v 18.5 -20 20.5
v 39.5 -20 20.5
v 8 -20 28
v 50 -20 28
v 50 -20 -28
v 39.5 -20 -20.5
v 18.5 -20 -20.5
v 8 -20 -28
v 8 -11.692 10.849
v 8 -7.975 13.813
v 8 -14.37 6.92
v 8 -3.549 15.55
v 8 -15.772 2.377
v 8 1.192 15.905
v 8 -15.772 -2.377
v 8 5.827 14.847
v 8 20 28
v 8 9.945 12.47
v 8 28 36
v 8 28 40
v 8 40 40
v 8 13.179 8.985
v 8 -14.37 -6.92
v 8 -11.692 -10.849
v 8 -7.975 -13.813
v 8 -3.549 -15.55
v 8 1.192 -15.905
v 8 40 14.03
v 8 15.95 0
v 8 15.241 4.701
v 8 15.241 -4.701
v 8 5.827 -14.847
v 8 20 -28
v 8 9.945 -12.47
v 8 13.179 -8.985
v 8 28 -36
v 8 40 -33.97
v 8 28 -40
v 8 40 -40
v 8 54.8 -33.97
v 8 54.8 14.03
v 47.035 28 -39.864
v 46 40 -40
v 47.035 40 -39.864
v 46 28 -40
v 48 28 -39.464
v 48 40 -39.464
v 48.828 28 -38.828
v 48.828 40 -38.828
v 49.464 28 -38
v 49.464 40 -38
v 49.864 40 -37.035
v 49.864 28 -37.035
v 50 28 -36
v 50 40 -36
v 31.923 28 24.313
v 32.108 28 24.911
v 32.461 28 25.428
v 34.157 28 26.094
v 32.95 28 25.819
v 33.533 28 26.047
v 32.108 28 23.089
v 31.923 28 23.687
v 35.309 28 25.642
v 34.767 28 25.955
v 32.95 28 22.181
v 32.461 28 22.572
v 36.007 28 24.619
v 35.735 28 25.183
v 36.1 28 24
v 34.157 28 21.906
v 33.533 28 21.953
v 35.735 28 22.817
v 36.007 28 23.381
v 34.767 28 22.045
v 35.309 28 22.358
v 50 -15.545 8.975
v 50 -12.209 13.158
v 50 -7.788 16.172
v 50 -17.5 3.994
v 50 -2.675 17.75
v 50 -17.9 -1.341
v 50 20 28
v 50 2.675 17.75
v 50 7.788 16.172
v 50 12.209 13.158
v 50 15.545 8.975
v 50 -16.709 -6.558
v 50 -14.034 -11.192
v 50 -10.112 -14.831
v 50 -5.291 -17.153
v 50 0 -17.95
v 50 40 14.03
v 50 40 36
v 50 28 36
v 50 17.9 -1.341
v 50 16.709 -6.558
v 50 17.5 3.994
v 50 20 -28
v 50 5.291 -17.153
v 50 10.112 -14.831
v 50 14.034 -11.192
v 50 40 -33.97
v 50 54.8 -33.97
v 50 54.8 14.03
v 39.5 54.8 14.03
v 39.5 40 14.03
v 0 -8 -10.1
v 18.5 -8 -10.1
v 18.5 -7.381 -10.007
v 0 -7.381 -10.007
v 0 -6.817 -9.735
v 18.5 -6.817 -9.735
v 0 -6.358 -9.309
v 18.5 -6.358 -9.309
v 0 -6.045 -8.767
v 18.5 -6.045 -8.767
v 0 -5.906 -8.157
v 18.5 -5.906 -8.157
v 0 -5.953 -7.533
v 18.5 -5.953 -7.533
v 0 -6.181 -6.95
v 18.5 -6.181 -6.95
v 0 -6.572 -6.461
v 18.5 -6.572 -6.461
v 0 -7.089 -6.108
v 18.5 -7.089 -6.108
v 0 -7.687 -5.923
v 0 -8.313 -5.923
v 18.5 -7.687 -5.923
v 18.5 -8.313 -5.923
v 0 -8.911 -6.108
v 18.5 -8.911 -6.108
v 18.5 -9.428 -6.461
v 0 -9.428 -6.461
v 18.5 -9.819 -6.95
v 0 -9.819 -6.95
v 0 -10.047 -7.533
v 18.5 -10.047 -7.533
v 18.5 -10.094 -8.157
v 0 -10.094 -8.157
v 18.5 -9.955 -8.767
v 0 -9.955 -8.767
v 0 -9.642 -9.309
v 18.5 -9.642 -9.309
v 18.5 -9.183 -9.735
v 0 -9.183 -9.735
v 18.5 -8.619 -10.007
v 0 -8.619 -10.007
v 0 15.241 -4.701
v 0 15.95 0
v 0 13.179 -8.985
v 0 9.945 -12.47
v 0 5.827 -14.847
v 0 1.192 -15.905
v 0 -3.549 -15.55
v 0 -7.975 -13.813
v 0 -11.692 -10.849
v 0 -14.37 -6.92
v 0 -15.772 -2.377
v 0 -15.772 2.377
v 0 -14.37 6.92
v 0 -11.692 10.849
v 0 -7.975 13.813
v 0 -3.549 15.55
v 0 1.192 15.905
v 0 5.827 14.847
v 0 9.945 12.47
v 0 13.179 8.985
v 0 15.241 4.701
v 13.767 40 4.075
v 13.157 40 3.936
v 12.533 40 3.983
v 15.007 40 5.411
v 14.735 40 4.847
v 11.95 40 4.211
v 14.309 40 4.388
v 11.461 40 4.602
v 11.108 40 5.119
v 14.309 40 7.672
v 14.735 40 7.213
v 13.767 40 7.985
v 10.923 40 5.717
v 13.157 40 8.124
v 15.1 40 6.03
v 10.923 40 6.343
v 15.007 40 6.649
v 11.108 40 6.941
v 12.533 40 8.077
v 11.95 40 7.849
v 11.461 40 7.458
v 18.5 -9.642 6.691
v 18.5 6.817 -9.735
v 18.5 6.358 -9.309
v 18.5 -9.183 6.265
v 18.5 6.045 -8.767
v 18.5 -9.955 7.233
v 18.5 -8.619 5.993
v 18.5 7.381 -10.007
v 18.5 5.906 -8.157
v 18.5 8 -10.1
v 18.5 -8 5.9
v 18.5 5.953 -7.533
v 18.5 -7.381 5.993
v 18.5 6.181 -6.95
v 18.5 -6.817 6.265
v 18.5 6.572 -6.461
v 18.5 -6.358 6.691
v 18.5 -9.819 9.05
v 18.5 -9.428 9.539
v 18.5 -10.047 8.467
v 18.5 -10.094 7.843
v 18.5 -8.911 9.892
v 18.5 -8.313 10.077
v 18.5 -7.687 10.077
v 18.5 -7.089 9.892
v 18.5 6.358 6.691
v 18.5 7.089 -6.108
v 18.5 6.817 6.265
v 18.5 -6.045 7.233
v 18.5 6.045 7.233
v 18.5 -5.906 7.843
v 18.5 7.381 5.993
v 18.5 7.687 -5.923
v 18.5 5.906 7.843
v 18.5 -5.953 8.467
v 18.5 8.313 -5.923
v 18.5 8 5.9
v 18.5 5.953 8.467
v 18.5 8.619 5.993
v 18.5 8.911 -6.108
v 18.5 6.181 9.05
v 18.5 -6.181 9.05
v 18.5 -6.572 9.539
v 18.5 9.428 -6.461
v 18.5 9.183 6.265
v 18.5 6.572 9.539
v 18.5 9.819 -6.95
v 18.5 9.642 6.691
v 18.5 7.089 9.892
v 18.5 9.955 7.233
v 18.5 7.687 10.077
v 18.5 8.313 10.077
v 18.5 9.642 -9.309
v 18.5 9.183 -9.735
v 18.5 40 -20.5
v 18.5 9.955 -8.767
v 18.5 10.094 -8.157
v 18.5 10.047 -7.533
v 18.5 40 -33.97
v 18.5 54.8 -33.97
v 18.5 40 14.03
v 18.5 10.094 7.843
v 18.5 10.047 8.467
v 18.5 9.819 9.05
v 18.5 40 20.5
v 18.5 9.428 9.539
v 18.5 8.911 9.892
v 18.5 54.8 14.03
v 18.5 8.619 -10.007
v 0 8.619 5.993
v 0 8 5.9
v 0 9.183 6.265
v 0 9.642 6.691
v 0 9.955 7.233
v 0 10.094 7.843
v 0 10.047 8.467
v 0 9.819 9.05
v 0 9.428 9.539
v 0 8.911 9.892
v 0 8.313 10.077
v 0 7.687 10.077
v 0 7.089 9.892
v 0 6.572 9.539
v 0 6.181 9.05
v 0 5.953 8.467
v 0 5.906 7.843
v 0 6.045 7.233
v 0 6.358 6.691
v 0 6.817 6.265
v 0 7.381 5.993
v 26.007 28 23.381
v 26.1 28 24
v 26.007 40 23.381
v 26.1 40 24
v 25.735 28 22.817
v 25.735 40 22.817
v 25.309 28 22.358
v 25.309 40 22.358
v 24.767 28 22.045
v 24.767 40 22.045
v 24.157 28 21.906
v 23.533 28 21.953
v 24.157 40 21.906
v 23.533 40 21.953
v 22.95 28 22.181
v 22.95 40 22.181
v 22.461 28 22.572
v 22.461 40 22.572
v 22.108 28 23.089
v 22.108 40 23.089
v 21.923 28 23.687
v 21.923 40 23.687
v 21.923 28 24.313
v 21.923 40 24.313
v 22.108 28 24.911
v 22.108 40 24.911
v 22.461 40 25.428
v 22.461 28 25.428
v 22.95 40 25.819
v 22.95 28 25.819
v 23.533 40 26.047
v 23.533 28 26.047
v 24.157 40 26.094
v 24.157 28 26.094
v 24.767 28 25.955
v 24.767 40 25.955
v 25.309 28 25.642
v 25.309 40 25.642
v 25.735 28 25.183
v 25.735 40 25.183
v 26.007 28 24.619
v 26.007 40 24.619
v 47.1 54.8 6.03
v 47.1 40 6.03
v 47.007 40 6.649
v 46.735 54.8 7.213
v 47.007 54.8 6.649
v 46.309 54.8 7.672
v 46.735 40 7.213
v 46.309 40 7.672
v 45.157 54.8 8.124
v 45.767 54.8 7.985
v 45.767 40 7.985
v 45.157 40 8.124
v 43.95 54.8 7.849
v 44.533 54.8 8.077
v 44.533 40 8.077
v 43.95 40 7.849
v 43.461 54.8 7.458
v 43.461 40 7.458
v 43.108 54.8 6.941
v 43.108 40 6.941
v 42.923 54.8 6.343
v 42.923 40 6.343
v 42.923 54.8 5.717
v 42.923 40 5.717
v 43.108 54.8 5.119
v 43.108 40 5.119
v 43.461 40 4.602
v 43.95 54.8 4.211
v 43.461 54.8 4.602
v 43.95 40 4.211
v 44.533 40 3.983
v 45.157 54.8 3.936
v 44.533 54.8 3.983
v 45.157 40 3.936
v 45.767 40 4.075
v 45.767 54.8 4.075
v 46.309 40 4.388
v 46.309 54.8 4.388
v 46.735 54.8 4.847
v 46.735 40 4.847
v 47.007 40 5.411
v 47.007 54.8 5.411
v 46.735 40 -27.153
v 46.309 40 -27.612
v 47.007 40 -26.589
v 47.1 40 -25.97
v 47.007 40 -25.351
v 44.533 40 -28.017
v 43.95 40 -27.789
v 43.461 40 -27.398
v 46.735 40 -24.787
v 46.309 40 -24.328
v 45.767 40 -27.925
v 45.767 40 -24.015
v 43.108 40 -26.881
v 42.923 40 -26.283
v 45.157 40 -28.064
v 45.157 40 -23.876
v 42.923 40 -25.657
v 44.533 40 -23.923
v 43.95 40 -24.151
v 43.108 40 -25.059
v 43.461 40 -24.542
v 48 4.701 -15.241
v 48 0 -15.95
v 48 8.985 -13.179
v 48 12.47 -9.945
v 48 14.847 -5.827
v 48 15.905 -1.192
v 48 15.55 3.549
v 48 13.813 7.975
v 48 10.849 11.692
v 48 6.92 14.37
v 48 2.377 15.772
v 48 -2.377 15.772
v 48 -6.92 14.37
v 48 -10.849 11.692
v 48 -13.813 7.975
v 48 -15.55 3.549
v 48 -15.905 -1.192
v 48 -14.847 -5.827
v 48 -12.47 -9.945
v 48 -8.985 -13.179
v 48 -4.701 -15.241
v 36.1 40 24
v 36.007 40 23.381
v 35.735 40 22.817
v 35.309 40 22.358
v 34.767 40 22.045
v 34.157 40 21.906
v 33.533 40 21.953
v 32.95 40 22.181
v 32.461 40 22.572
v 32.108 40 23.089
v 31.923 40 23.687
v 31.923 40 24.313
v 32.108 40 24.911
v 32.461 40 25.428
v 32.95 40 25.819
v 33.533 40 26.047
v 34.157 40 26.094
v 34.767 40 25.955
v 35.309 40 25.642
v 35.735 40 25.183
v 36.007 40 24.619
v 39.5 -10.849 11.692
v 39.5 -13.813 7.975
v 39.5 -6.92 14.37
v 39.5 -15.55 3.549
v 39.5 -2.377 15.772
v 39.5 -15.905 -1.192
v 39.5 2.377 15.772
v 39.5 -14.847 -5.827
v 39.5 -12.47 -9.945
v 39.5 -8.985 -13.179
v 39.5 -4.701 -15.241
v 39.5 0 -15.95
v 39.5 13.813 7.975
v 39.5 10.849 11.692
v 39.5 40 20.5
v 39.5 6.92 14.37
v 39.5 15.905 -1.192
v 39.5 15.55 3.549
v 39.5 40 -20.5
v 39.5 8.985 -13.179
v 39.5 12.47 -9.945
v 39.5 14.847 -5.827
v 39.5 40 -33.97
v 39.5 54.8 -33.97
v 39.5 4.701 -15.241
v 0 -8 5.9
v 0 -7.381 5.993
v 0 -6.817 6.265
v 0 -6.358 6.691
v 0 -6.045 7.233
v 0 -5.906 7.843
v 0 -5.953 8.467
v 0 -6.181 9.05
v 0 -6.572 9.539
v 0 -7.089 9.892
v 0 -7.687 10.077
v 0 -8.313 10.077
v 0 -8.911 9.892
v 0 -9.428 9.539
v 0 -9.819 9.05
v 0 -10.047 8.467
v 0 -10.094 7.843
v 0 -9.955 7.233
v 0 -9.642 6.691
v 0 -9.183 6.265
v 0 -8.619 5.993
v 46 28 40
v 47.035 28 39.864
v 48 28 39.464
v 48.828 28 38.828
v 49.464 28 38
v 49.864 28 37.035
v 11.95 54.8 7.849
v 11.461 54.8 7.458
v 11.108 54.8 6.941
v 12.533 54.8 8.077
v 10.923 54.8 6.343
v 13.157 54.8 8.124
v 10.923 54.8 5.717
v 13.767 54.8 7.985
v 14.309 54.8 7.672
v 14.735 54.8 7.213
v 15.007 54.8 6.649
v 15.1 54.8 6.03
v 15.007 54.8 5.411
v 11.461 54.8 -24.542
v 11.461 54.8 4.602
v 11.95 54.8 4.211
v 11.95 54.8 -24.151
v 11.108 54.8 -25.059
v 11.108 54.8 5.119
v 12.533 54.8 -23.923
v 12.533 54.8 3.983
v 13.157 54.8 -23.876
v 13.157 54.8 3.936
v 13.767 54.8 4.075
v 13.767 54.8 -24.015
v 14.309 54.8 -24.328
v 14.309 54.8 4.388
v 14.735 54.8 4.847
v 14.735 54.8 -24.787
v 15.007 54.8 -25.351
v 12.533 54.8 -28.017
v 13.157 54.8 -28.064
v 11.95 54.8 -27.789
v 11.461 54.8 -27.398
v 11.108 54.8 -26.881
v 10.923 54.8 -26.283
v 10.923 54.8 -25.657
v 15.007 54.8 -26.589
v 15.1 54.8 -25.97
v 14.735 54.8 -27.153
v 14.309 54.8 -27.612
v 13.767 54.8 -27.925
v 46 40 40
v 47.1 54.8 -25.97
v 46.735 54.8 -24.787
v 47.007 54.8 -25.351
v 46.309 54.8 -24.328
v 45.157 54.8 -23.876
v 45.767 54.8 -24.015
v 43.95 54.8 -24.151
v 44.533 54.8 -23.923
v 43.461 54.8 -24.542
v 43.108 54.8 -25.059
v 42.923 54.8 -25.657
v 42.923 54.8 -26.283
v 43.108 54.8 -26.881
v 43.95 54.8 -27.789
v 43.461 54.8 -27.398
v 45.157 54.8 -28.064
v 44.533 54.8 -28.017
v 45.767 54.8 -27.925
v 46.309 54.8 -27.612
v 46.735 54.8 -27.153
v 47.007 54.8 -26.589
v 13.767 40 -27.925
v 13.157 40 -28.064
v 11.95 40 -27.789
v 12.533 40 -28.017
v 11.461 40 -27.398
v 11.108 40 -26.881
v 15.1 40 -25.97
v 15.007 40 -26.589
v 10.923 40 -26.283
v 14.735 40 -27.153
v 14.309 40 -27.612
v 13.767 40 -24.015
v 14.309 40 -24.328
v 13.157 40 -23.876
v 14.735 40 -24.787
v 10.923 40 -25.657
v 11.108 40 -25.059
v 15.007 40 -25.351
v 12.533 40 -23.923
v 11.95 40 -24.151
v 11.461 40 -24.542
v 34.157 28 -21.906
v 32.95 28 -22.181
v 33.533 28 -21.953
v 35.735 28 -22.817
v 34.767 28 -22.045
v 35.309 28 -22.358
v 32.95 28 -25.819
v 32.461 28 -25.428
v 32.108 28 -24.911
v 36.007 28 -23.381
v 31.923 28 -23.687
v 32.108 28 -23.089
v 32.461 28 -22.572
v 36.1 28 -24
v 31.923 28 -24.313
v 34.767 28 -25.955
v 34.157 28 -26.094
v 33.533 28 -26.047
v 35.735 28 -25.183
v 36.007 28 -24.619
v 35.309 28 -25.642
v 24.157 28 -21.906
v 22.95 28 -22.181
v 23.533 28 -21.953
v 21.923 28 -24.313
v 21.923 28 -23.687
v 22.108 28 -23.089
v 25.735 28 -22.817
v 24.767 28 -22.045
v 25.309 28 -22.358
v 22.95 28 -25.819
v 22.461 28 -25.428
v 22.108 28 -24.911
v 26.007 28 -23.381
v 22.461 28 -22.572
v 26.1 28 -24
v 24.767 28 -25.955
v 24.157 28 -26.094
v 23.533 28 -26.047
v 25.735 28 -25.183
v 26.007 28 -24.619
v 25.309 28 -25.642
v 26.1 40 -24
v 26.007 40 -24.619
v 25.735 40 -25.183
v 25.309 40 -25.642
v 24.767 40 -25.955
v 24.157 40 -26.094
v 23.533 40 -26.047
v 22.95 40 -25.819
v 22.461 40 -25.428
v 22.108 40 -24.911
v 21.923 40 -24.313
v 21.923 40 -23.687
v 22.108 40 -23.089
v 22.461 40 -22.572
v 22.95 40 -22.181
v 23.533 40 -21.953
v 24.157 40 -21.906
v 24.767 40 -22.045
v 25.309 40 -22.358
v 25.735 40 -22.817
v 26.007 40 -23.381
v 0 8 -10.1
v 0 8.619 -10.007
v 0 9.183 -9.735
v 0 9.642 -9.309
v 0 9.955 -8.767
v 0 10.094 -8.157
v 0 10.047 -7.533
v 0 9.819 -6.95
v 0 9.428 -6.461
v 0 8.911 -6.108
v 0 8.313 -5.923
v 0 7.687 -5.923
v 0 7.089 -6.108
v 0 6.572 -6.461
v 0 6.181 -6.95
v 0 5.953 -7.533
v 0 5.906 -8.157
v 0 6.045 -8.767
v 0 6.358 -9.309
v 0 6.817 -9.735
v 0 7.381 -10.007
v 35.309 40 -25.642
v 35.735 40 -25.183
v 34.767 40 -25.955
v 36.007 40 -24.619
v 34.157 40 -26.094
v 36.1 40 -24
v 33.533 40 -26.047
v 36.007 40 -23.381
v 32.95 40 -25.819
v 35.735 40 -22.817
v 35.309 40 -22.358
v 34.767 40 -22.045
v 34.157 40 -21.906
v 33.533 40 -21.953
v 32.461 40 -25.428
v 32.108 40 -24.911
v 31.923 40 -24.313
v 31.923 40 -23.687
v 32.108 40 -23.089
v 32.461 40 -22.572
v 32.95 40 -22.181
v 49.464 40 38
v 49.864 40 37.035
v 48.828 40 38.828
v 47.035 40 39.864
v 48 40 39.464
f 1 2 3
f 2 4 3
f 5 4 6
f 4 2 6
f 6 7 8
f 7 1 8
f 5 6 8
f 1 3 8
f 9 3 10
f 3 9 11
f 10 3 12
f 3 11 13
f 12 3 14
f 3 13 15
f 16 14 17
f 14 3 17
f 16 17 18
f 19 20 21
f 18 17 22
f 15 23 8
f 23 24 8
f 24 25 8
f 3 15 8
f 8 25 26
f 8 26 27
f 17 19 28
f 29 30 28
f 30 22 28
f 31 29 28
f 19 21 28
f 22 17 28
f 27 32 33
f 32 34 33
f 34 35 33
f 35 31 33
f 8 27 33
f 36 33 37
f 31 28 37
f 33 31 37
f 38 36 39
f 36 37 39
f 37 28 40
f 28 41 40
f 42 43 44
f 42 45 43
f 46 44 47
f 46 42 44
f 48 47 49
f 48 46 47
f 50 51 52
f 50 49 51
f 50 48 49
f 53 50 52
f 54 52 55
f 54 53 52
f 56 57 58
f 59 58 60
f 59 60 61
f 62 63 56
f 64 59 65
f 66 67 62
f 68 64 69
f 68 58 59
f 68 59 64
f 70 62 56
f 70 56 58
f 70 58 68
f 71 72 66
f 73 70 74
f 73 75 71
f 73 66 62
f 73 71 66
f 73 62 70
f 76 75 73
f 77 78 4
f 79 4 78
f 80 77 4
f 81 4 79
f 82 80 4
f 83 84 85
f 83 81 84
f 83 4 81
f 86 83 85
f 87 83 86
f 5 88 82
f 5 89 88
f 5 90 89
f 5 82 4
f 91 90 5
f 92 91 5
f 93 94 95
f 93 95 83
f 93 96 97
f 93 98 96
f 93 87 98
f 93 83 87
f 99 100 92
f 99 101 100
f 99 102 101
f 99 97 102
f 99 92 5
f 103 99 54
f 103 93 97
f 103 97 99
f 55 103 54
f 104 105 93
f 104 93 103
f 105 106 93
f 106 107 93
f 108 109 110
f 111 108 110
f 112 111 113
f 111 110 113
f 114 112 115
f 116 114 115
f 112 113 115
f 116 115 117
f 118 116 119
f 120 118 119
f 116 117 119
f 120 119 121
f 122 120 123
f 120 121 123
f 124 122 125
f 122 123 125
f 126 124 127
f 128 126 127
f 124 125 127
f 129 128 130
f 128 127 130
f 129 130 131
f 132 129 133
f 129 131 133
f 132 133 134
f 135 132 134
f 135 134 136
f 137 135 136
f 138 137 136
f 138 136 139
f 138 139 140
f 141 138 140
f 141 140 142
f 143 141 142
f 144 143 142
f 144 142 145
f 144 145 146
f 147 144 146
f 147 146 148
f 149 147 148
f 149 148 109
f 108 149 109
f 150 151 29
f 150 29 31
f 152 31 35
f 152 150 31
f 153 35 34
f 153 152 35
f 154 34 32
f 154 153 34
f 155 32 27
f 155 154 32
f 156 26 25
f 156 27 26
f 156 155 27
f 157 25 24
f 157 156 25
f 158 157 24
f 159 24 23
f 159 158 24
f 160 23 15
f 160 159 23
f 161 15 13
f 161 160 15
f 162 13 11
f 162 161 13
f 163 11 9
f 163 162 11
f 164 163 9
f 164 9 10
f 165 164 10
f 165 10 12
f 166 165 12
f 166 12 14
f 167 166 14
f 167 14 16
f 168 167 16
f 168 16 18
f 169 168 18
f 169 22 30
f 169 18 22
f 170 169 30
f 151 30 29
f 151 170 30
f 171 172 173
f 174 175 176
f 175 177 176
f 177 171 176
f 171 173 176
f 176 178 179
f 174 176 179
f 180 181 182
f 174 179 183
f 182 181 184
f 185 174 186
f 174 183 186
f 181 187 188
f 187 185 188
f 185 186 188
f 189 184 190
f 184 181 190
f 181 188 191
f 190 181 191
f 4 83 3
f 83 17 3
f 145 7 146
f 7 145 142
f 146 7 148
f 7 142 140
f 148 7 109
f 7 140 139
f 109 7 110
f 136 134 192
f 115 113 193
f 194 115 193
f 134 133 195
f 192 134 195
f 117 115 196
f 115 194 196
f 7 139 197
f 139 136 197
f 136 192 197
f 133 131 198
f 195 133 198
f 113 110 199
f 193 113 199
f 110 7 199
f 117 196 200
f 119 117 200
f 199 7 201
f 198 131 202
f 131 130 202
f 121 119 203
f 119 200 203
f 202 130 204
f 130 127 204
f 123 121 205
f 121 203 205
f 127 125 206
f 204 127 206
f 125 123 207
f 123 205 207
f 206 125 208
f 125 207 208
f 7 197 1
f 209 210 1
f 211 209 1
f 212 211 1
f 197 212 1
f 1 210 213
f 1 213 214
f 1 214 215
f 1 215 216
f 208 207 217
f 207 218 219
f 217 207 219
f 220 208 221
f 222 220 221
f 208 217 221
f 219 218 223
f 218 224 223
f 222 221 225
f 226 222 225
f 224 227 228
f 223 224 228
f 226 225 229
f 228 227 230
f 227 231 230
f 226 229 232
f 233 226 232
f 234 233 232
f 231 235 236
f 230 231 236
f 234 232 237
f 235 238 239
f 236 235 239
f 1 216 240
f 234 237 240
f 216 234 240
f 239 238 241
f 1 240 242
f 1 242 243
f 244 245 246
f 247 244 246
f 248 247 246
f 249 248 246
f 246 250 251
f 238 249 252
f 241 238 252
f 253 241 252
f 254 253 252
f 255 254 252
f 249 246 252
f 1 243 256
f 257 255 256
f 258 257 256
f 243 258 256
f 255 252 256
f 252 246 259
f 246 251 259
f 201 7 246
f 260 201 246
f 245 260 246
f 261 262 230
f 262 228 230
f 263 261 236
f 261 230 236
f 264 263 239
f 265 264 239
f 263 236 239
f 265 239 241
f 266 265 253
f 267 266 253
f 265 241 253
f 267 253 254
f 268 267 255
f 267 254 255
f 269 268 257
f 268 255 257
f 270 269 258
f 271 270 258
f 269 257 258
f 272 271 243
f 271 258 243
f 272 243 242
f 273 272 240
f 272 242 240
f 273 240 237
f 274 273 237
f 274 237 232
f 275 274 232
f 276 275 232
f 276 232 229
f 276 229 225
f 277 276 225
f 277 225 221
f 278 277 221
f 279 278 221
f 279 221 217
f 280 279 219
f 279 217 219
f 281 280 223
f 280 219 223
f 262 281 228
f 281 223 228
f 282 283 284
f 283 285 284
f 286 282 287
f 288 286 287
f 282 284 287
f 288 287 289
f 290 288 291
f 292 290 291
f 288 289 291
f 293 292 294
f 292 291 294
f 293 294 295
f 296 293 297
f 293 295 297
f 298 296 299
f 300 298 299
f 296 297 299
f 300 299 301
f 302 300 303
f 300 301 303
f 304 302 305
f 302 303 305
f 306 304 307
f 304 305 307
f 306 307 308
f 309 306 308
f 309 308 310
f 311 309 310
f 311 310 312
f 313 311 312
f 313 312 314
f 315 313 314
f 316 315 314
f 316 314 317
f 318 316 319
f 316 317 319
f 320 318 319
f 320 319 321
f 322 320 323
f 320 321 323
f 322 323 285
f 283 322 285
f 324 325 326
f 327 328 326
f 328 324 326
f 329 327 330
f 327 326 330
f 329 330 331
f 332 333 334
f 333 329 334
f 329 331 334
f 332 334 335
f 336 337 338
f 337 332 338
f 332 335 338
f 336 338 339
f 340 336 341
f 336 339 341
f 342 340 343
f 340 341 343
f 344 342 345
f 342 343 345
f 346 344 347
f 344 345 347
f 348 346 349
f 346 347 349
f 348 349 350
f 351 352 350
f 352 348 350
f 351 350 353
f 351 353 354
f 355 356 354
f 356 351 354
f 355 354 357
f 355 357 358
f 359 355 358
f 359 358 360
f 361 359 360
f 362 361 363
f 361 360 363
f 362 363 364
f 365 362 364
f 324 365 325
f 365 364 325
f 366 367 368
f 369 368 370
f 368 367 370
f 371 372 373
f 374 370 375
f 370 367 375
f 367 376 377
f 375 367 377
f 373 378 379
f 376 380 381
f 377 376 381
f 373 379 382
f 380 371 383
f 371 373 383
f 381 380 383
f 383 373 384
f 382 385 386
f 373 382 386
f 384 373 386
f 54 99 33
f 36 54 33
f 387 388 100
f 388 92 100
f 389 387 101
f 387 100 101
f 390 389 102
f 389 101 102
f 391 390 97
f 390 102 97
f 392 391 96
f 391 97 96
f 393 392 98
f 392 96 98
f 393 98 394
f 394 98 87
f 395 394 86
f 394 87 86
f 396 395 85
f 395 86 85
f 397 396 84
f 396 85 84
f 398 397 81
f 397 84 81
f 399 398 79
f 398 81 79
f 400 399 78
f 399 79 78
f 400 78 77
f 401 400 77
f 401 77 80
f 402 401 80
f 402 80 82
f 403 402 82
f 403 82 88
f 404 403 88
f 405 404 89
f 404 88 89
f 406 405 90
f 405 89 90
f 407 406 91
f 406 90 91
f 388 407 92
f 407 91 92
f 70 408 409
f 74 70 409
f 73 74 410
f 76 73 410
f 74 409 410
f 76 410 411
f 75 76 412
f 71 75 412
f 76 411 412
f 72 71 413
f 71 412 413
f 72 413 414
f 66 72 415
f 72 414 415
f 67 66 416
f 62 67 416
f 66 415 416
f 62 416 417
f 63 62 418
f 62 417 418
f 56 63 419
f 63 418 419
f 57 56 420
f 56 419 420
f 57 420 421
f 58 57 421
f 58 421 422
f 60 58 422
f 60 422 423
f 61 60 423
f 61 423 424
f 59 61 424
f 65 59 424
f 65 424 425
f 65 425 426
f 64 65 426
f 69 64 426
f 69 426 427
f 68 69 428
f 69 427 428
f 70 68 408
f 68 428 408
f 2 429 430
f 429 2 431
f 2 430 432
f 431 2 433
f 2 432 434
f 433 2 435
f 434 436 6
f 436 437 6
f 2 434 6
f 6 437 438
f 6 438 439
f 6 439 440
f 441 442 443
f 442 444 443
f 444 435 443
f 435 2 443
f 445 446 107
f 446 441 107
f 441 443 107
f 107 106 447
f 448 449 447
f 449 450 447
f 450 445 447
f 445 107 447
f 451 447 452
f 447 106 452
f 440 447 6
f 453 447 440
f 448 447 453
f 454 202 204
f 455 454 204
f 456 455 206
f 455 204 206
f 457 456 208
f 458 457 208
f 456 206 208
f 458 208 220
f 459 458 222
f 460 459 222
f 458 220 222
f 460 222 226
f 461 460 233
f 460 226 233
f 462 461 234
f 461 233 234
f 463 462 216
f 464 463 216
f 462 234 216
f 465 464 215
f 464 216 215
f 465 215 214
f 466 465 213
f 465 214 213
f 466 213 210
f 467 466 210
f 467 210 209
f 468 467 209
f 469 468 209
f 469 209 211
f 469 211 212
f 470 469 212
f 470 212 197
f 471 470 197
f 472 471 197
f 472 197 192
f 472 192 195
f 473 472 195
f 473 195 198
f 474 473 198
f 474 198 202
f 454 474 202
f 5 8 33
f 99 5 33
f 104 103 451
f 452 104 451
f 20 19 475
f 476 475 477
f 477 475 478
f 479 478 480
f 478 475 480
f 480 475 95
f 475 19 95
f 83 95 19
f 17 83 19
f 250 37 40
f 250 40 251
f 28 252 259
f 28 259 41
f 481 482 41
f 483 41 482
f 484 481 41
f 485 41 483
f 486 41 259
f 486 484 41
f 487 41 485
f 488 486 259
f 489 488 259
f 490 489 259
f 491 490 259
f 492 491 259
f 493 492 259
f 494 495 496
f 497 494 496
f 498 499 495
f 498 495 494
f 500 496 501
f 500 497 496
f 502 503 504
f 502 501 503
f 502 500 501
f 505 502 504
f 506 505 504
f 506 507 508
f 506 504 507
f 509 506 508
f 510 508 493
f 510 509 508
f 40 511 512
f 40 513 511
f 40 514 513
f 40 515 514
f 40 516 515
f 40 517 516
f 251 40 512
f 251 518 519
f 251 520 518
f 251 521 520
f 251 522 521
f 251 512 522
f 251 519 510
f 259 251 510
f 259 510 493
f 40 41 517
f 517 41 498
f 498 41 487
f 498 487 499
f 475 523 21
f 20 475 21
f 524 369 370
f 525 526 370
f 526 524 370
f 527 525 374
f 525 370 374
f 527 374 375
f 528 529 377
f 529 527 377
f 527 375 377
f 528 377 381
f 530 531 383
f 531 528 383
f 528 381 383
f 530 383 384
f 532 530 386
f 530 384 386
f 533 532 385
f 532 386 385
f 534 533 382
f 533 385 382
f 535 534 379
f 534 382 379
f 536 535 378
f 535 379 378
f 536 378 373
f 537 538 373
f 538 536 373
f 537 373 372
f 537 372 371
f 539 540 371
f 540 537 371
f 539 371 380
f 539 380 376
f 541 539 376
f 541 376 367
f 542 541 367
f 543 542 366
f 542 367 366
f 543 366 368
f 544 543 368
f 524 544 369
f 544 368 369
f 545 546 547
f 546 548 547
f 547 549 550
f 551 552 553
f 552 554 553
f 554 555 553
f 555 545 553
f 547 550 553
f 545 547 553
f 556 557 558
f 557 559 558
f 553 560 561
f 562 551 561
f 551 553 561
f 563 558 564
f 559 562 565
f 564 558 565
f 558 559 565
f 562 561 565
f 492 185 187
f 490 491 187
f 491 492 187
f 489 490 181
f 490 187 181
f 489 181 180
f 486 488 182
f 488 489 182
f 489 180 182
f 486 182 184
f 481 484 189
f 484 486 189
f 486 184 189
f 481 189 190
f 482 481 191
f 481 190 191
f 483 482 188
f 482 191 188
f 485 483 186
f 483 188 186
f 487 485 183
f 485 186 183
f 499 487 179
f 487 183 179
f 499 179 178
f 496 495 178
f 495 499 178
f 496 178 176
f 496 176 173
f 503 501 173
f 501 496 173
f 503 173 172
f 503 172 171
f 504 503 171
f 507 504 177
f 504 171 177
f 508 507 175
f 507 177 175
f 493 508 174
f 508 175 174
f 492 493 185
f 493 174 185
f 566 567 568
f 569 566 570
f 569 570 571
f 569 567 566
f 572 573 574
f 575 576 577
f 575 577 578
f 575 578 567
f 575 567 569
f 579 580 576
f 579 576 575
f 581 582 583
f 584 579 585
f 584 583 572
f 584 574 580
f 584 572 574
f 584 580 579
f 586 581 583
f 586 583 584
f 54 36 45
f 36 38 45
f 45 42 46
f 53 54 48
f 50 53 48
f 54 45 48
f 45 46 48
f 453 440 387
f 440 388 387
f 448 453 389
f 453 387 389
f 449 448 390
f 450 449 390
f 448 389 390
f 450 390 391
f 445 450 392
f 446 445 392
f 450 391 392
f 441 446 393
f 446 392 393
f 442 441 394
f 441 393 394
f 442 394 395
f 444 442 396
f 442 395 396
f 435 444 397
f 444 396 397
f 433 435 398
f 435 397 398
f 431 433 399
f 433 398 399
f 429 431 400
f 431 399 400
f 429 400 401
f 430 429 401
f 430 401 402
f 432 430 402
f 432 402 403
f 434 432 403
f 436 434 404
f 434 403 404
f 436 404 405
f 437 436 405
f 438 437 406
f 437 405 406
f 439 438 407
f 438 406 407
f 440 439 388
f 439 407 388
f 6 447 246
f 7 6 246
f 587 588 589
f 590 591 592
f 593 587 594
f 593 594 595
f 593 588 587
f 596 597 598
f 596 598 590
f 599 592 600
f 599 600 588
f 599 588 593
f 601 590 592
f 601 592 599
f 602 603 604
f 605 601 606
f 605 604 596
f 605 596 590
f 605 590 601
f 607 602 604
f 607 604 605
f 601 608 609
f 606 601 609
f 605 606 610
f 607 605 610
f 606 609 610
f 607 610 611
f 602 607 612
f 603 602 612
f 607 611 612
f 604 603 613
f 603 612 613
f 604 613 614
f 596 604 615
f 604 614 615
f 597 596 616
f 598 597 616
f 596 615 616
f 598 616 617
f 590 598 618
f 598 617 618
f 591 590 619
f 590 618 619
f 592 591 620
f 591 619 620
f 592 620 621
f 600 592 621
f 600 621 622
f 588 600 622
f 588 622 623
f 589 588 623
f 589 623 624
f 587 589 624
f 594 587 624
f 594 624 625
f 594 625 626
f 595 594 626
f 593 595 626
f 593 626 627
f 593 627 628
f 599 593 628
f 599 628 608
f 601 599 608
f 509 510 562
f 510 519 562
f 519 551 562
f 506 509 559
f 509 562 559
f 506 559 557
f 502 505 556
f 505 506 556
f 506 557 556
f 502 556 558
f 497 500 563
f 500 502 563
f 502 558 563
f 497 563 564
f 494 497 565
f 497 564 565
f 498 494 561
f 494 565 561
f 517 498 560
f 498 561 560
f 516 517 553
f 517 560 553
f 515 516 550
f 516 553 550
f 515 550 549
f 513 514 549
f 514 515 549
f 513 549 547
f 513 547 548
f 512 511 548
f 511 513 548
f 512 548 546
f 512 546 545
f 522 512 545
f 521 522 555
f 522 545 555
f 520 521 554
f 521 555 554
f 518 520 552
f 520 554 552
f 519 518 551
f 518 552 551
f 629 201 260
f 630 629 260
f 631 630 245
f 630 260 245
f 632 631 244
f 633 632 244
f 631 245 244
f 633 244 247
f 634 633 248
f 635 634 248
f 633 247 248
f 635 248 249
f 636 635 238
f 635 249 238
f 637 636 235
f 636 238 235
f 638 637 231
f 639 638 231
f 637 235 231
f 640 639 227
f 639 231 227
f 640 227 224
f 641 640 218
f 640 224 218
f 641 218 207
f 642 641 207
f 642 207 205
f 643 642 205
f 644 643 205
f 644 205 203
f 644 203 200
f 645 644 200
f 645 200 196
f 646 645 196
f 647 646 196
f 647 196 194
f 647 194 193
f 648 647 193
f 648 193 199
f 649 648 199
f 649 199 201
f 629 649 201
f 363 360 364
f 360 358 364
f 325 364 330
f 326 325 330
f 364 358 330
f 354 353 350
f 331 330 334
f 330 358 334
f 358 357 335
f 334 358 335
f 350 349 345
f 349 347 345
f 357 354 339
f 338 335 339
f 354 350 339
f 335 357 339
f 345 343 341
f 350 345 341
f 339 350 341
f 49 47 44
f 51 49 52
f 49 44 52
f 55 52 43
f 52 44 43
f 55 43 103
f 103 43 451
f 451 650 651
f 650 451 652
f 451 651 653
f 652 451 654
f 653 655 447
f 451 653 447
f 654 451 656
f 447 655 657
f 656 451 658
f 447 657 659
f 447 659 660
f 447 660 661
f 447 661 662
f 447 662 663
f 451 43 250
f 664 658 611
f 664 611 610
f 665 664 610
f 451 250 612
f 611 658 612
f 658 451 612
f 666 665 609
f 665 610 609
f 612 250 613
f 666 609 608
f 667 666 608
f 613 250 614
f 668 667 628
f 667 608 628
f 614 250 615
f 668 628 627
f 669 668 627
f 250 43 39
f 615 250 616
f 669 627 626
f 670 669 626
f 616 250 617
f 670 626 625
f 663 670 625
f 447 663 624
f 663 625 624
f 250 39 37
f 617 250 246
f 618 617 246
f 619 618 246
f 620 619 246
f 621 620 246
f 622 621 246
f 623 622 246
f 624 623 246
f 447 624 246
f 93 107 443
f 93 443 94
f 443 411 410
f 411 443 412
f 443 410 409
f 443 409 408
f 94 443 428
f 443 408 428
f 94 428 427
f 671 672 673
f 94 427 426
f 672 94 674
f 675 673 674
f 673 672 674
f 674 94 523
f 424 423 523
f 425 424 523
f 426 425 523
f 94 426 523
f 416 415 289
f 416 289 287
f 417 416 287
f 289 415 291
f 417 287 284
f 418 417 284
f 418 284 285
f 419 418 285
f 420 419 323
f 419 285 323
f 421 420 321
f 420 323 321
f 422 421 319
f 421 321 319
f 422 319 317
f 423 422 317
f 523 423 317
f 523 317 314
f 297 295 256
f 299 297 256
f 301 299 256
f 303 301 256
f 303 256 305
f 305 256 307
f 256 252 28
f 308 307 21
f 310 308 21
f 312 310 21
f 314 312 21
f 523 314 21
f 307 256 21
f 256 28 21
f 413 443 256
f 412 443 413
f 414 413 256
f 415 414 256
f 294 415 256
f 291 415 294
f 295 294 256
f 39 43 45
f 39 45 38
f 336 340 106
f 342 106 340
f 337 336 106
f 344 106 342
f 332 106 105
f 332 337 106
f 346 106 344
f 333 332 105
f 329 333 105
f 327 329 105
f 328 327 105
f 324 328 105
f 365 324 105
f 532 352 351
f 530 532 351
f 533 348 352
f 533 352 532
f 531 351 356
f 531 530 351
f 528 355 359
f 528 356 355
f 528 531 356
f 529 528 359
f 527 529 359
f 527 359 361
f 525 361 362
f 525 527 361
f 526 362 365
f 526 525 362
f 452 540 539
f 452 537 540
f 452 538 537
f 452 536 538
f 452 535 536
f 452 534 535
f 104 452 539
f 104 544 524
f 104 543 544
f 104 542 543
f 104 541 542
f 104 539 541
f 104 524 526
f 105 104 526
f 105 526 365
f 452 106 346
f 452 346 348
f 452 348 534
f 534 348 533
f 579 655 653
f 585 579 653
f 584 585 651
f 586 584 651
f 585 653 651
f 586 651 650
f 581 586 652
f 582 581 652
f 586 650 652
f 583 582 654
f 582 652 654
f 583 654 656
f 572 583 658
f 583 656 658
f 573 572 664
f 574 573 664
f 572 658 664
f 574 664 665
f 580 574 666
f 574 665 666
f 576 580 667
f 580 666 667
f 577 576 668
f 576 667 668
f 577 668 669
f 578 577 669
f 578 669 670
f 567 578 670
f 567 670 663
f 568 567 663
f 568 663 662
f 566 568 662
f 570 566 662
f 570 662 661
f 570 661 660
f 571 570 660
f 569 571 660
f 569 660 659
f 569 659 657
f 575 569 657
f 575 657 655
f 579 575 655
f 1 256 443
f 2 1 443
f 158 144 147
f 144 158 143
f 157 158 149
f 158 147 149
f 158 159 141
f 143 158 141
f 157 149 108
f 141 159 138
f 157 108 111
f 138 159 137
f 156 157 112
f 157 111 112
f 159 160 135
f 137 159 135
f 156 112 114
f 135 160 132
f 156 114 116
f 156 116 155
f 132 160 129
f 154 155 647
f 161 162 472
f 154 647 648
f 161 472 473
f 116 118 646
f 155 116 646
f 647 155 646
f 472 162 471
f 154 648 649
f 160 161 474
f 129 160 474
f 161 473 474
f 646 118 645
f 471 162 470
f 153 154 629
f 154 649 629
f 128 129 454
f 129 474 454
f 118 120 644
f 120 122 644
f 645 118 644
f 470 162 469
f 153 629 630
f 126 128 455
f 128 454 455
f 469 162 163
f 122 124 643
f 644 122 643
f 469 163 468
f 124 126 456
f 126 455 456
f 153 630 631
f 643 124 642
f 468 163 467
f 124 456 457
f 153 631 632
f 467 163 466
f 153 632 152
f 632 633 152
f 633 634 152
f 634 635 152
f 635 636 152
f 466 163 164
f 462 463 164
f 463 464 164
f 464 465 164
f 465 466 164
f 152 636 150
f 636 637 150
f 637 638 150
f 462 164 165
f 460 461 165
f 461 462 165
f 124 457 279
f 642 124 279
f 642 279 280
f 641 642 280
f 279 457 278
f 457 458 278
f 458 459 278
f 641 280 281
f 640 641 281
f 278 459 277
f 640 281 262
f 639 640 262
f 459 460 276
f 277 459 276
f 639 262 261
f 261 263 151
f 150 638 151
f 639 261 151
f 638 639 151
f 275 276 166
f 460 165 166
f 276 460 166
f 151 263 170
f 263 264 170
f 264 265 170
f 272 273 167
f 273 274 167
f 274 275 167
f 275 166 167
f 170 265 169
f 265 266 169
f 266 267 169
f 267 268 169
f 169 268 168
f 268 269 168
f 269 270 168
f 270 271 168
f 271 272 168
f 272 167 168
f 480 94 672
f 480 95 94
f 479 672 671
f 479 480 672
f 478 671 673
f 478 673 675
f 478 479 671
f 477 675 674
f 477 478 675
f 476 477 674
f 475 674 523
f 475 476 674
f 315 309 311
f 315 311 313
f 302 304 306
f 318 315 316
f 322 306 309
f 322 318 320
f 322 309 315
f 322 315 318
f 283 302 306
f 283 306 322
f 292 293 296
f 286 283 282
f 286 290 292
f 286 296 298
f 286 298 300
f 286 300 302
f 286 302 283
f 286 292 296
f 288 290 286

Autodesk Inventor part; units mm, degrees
ref_plane "YZ Plane" through (0, 0, 0) normal (1, 0, 0) x (0, 1, 0)
ref_plane "XZ Plane" through (0, 0, 0) normal (0, 1, 0) x (-1, 0, 0)
ref_plane "XY Plane" through (0, 0, 0) normal (0, 0, 1) x (1, 0, 0)
sketch "Sketch1" plane through (0, 0, 0) normal (1, 0, 0) x (0, 1, 0)
  circle A0 centre (0, 0) radius 15.95
  dimension "d0" = 31.9
extrude "Extrusion1" add sketch "Sketch1" along normal blind 8
sketch "Sketch2" plane through (8, 0, 0) normal (1, 0, 0) x (0, 0, -1)
  line L0 (-28, -20) -> (28, -20)
  line L1 (28, -20) -> (28, 40)
  line L2 (28, 40) -> (-28, 40)
  line L3 (-28, 40) -> (-28, -20)
  line L4 (-28, -20) -> (28, 40) construction
  line L5 (28, -20) -> (-28, 40) construction
  point P0 (0, 0)
  point P1 (0, 10)
  point P2 (0, 10)
  dimension "d3" = 60
  dimension "d4" = 56
  dimension "d46" = 10
extrude "Extrusion2" add sketch "Sketch2" along normal blind 42
sketch "Sketch3" plane through (8, 40, 28) normal (0, 1, 0) x (1, 0, 0)
  line L0 (0, 56) -> (42, 56) projected
  line L1 (21, 56) -> (21, 0) construction
  line L2 (0, 0) -> (42, 0) projected
  line L3 (10.5, 7.5) -> (31.5, 7.5)
  line L4 (31.5, 7.5) -> (31.5, 48.5)
  line L5 (31.5, 48.5) -> (10.5, 48.5)
  line L6 (10.5, 48.5) -> (10.5, 7.5)
  line L7 (10.5, 7.5) -> (31.5, 48.5) construction
  line L8 (31.5, 7.5) -> (10.5, 48.5) construction
  point P0 (-8, 28)
  point P1 (21, 28)
  dimension "d7" = 21
  dimension "d8" = 41
extrude "Extrusion3" cut sketch "Sketch3" against normal through all
sketch "Sketch4" plane through (50, 0, 0) normal (1, 0, 0) x (0, 0, -1)
  circle A0 centre (0, 0) radius 15.95 projected
extrude "Extrusion4" cut sketch "Sketch4" against normal up to surface (10.5 mm away)
sketch "Sketch5" plane through (18.5, 40, 20.5) normal (1, 0, 0) x (0, 0, -1)
  circle A0 centre (20.5, -40) radius 15.95 construction
  circle A1 centre (12.5, -32) radius 2.1
  circle A2 centre (12.5, -48) radius 2.1
  circle A3 centre (28.5, -48) radius 2.1
  circle A4 centre (28.5, -32) radius 2.1
  dimension "d13" = 4.2
  dimension "d14" = 8
  dimension "d15" = 8
  dimension "d18" = 360
extrude "Extrusion5" cut sketch "Sketch5" against normal through all
sketch "Sketch6" plane through (8, 40, 28) normal (0, 1, 0) x (1, 0, 0)
  line L0 (31.5, 48.5) -> (10.5, 48.5) construction
  line L1 (21, 48.5) -> (21, 7.5) construction
  line L2 (10.5, 7.5) -> (31.5, 7.5) construction
  line L3 (0, 0) -> (42, 0) projected
  line L4 (0, 0) -> (42, 0)
  line L5 (42, 0) -> (42, -12)
  line L6 (42, -12) -> (0, -12)
  line L7 (0, -12) -> (0, 0)
  line L8 (10.5, 7.5) -> (10.5, 48.5) construction
  line L9 (10.5, 28) -> (31.5, 28) construction
  line L10 (31.5, 12.05) -> (31.5, 43.95) construction
  line L11 (0, 56) -> (42, 56)
  line L12 (0, 56) -> (42, 56)
  line L13 (42, 56) -> (42, 68)
  line L14 (42, 68) -> (0, 68)
  line L15 (0, 68) -> (0, 56)
  point P0 (-8, 28)
  point P1 (21, 28)
  dimension "d25" = 12
extrude "Extrusion6" add sketch "Sketch6" against normal blind 12
sketch "Sketch8" plane through (8, 40, 40) normal (0, 1, 0) x (1, 0, 0)
  line L0 (10.5, 19.5) -> (31.5, 19.5) construction
  line L1 (21, 19.5) -> (21, 60.5) construction
  line L2 (31.5, 60.5) -> (10.5, 60.5) construction
  circle A0 centre (26, 16) radius 2.1
  line L3 (31.5, 19.5) -> (10.5, 19.5) projected
  line L4 (10.5, 19.5) -> (10.5, 60.5) construction
  line L5 (10.5, 40) -> (31.5, 40) construction
  line L6 (31.5, 24.05) -> (31.5, 55.95) construction
  circle A1 centre (16, 16) radius 2.1
  circle A2 centre (26, 64) radius 2.1
  circle A3 centre (16, 64) radius 2.1
  point P0 (-8, 40)
  point P1 (21, 40)
  dimension "d31" = 4.2
  dimension "d32" = 5
  dimension "d33" = 24
extrude "Extrusion8" cut sketch "Sketch8" against normal up to surface (12 mm away)
fillet "Fillet2" radius 4 2 edges at (50, 34, 40) (50, 34, -40)
chamfer "Chamfer1" distance 2 angle 45 1 edges at (50, 0, 15.95)
chamfer "Chamfer2" distance 8 angle 45 2 edges at (29, 28, 28) (29, 28, -28)
sketch "Sketch10" plane through (8, 40, 40) normal (0, 1, 0) x (1, 0, 0)
  line L0 (31.5, 60.5) -> (10.5, 60.5) construction
  line L1 (21, 60.5) -> (21, 19.5) construction
  line L2 (31.5, 19.5) -> (10.5, 19.5) construction
  circle A0 centre (5, 33.97) radius 2.1
  circle A1 centre (5, 65.97) radius 2.1
  circle A2 centre (37, 33.97) radius 2.1
  circle A3 centre (37, 65.97) radius 2.1
  line L3 (0, 80) -> (0, 0) construction
  line L4 (0, 73.97) -> (10.5, 73.97)
  line L5 (10.5, 73.97) -> (10.5, 25.97)
  line L6 (10.5, 25.97) -> (0, 25.97)
  line L7 (0, 25.97) -> (0, 73.97)
  line L8 (5, 65.97) -> (5, 33.97) construction
  line L9 (42, 73.97) -> (31.5, 73.97)
  line L10 (31.5, 73.97) -> (31.5, 25.97)
  line L11 (31.5, 25.97) -> (42, 25.97)
  line L12 (42, 25.97) -> (42, 73.97)
  point P0 (-8, 40)
  point P1 (21, 40)
  point P2 (10.5, 49.97)
  point P3 (5, 49.97)
  dimension "d58" = 4.2
  dimension "d60" = 16
  dimension "d61" = 4.2
  dimension "d62" = 32
  dimension "d63" = 48
  dimension "d64" = 10.5
  dimension "d67" = 9.97
extrude "Extrusion10" add sketch "Sketch10" along normal blind 14.8
properties part number "VerticalAxisServoMount"
